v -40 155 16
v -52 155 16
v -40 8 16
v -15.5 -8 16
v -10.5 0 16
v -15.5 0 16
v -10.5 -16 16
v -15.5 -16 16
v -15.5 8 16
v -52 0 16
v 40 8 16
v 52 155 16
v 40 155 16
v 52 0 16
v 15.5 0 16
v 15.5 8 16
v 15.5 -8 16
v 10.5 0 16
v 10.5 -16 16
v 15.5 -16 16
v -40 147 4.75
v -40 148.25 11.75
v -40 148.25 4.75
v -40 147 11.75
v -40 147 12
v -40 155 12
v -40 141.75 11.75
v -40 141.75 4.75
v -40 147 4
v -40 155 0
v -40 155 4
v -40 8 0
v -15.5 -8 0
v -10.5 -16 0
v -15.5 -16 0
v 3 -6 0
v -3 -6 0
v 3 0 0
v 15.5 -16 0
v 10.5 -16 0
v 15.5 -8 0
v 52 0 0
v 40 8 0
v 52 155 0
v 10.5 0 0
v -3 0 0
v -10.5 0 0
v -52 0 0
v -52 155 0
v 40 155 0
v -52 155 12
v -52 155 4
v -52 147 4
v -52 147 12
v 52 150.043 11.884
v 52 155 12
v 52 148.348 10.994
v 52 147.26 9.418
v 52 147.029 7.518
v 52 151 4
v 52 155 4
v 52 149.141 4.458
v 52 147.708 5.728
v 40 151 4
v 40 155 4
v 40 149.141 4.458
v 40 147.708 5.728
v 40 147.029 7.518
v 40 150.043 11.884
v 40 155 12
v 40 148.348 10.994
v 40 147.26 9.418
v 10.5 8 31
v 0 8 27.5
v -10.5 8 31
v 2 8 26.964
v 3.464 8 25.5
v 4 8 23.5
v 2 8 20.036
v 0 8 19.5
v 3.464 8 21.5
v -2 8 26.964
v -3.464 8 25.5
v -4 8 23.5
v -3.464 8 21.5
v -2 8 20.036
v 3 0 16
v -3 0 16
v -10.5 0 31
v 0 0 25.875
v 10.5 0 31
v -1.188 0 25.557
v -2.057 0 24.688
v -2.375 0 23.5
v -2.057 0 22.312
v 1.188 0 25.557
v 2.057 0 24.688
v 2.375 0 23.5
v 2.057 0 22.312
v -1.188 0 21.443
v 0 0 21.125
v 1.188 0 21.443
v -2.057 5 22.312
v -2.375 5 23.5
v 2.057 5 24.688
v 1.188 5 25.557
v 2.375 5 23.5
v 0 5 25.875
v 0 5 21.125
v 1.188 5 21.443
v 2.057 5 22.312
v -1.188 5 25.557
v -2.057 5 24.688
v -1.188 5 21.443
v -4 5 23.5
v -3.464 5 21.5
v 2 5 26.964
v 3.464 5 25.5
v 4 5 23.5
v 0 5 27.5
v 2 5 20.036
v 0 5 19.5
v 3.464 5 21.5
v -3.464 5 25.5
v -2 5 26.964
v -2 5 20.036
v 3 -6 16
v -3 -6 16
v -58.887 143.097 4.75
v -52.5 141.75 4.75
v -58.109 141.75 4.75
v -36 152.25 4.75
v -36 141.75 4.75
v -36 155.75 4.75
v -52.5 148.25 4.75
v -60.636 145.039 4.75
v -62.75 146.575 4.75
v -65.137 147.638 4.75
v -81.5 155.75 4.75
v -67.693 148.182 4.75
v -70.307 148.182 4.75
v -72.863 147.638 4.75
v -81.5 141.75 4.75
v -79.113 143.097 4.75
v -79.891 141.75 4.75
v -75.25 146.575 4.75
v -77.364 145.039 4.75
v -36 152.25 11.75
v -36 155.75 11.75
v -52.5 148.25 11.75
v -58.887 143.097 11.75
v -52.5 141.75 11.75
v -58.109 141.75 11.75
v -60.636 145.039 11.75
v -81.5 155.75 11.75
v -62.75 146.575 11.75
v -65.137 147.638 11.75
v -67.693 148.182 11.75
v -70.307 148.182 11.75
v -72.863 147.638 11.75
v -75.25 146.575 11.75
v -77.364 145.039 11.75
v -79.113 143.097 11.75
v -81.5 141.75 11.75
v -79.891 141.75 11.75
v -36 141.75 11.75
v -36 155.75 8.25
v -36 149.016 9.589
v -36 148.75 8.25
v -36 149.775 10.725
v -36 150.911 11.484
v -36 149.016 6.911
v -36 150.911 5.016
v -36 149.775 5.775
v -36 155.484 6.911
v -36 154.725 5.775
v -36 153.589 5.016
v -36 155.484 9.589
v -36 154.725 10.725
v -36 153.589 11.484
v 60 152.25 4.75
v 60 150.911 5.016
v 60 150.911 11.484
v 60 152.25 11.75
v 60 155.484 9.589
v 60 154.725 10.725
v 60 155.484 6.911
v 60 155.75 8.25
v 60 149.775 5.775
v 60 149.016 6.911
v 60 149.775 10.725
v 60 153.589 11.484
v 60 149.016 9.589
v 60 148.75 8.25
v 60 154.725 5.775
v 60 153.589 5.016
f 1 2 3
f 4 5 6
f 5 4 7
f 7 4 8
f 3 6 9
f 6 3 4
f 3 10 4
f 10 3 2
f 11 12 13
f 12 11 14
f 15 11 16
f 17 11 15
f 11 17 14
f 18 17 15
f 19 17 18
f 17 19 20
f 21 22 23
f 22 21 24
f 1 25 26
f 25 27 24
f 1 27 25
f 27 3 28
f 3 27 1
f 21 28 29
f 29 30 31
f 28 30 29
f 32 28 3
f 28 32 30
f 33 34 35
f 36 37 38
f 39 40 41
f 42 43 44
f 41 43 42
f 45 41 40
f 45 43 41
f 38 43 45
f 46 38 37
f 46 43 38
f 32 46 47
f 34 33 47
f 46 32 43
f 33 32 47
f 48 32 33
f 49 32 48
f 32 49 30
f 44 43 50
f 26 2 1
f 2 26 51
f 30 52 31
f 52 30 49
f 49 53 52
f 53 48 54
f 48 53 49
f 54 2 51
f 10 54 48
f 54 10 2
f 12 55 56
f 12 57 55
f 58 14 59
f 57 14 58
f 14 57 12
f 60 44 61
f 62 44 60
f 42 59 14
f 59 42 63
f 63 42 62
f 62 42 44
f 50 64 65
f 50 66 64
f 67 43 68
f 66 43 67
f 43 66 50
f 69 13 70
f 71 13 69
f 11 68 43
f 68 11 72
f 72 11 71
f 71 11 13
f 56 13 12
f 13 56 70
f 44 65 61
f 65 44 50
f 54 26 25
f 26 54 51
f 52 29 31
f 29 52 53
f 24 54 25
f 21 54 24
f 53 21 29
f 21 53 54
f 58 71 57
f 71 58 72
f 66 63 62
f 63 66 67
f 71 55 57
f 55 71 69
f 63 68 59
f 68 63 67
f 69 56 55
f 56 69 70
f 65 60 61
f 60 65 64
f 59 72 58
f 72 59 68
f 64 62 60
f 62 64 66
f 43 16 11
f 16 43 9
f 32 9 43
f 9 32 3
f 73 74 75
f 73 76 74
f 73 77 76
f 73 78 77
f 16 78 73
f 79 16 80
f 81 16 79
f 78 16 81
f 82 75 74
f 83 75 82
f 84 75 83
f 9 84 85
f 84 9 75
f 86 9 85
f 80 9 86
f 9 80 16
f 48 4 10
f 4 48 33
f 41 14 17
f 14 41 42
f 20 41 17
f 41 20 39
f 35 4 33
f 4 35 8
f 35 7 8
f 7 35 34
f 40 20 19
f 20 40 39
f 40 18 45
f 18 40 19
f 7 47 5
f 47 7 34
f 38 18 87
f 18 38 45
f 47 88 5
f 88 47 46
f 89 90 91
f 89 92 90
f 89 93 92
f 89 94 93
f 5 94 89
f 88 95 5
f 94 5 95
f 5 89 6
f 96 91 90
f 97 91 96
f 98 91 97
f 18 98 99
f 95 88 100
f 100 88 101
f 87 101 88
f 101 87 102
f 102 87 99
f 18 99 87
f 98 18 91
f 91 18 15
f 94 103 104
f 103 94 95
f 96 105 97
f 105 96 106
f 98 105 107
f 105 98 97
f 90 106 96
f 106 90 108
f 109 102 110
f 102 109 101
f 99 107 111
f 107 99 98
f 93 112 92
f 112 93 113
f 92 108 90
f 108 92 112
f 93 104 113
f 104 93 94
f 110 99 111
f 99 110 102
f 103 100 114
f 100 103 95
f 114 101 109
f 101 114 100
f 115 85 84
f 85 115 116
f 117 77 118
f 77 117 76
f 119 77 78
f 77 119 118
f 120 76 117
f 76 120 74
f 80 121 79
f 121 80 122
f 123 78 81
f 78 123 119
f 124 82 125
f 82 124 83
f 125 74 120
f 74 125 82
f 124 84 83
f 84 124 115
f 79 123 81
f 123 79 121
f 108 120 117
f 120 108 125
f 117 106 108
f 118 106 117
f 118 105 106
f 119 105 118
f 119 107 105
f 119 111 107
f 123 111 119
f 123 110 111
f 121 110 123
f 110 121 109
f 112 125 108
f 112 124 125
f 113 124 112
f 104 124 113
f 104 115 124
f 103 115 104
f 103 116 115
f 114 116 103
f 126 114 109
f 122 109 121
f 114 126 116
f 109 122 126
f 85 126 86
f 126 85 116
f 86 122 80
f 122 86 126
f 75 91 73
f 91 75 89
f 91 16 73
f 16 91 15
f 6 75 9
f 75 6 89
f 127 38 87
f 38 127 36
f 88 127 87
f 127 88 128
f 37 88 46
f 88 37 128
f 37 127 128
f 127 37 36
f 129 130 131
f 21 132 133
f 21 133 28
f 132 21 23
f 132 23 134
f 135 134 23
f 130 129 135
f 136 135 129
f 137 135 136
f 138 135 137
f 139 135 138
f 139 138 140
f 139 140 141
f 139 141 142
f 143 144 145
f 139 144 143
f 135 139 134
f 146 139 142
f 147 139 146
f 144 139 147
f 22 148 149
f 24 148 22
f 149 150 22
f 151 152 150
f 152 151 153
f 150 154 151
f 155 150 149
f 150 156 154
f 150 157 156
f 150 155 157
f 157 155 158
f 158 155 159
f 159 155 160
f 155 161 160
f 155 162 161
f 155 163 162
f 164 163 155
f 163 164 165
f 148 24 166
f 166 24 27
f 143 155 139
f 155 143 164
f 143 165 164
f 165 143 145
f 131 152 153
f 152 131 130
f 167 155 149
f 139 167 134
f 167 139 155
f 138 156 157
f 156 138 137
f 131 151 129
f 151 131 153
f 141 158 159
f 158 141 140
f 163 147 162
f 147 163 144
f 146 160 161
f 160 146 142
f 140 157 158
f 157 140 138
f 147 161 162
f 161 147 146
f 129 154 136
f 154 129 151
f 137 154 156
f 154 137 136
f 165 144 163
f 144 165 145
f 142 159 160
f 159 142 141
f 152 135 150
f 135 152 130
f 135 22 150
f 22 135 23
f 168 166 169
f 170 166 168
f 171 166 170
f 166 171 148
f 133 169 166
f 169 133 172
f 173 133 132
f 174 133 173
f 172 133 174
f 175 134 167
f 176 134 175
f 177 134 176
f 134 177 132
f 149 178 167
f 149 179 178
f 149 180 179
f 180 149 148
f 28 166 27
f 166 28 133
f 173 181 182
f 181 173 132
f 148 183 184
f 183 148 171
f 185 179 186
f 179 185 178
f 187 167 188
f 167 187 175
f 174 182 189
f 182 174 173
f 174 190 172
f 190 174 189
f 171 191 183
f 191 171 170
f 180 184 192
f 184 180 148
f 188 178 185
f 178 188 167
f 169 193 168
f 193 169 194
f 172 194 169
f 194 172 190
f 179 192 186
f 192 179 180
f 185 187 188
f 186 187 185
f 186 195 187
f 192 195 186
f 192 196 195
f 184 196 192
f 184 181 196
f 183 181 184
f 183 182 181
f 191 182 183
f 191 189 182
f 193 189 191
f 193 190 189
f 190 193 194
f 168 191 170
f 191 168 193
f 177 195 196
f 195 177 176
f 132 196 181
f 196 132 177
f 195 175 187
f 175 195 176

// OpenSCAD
/* https://www.thingiverse.com/theamm/about */

// Current part display
part = "both"; // [both:Both, holder:Holder, rod:Rod]

// Should we offset the mount part?
mount_center_offset = 0; // [-50:50]

// Thickness (Y-wise) of the arms
arm_thickness = 12;
// Width (X-wise) of the arms
arm_width     = 16;

// Maximum width of a roll to fit between the arms
roll_width = 80;
// Maximum diameter of a roll to account for
roll_diameter = 200;
// The biggest roll center hole to account for
roll_hole_diameter = 60;

// Support rod diameter
rod_diameter = 7.5;

// How far down will the slanted support reach?
// 0.0 disables it, 1.0 will reach all the way down.
mount_support_height_ratio = 0.5;

/* [Hidden] */

rod_support_thickness = 4;
rod_clearance = 8; // Extra width on the rod

// 2020 aluminum bar
bar_width = 20 + 1;
bar_center_width = 6; // The center hole

base_height = 8;     // The "floor" between the arms
mount_thickness = 5; // The thickness of the prongs
mount_height = 16;

// Screw hole
mount_hole_diameter  = 4.0 + 0.75;
// Screw well
mount_hole_well = 8.0;


clearance_margin = 25;
minimum_clearance = (roll_diameter + roll_hole_diameter)/2 + clearance_margin;

output_part();

// Creates two mirrored arms with the given distance, height and thickness
module holder_arms(arm_separation, arm_width, arm_thickness, arm_height) {
    module single_arm() {
        translate([arm_separation/2, 0])
            cube([arm_thickness, arm_height, arm_width]);
    }
    union() {
        mirror() single_arm();
                 single_arm();
    }
}

// Roll holder
module roll_holder() {
    difference() {
        holder_arms(roll_width, arm_width, arm_thickness, minimum_clearance);
        
        r_d = rod_diameter + 0.5; // Adjust fit a bit
        
        // Left cube slot
        translate([-roll_width/2-arm_thickness - 1, minimum_clearance-r_d, (arm_width-r_d)/2])
            cube([arm_thickness+2, r_d, r_d]);
        
        // Right cylinder slot
        hull() {
            
            translate([roll_width/2-1, minimum_clearance, (arm_width-r_d)/2])
                cube([arm_thickness+2, r_d, r_d]);
            translate([roll_width/2-1, minimum_clearance-(r_d/2), (arm_width)/2])
                rotate([0, 90,0]) cylinder(d=r_d, h=arm_thickness+2);
        }
    }
    
    mount_bot_w = bar_width + mount_thickness*2;
    mount_bot_hull_h = mount_height * mount_support_height_ratio;
    // Bottom structure
    difference() {
        union() {
            hull() {
                // Center base "floor"
                translate([0, base_height/2, arm_width/2])
                    cube([roll_width + arm_thickness*2, base_height, arm_width], center=true);
                // The end piece for slanted supports
                translate([-mount_bot_w/2 + mount_center_offset, -mount_bot_hull_h, 0])
                    cube([mount_bot_w, mount_bot_hull_h, arm_width]);
            }
            
            // Full-size end piece for prongs
            translate([-mount_bot_w/2 + mount_center_offset, -mount_height, 0])
                    cube([mount_bot_w, mount_height, arm_width]);
        }
        
        // Remove 2020 (fudged a bit for clean previews)
        translate([-bar_width/2 + mount_center_offset, -bar_width-1, -1])
                cube([bar_width, bar_width+1, arm_width+2]);
    }
    
    translate([mount_center_offset, 0]) {
        // Center plug for mount
        translate([-bar_center_width/2, -bar_center_width])
            cube([bar_center_width, bar_center_width, arm_width]);
        
        // Mount lip
        translate([0,0, arm_width]) {
            lip_w1 = mount_bot_w;
            lip_w2 = bar_width;
            lip_l  = 15;
            difference() {
                hull() {
                    // Base
                    translate([-lip_w1/2, 0, -arm_width]) cube([lip_w1, base_height, arm_width]);
                    // End
                    translate([-lip_w2/2, 0, lip_l-1]) cube([lip_w2, base_height, 1]);
                }
                // Screw hole
                translate([0, base_height, lip_l/2]) rotate([90,0,0]) {
                    cylinder(d=mount_hole_diameter, h=base_height+1, $fn=12);
                    translate([0,0,-1]) cylinder(d=mount_hole_well, h=3+1, $fn=12);
                }
            }
        }
    }
}

module roll_rod() {
    // Make the slot fit better
    spacing = 0.5;
    p_h = rod_diameter - spacing;
    // Center piece
    translate([-spacing, -p_h/2])
        cube([arm_thickness+spacing, rod_diameter, p_h]);
    
    // Back prong
    translate([-rod_support_thickness-spacing, -p_h/2])
            cube([rod_support_thickness, p_h*2, p_h]);
    // Front prong
    translate([arm_thickness, -p_h/2])
            cube([rod_support_thickness, p_h*2, p_h]);
    
    // Handle
    handle_w = 25;
    translate([-handle_w-spacing-rod_support_thickness, -p_h/2]) difference() {
        cube([handle_w, p_h*2, p_h]);
        translate([handle_w/2, p_h*2+6, -1]) cylinder(d=25, h=p_h+2);
    }
    
    // Cyl
    translate([arm_thickness, 0, p_h/2])
        rotate([0,90,0]) cylinder(d=p_h, h=roll_width + arm_thickness + rod_clearance, $fn=16);
}
//part="rod";
module output_part() {
    if (part == "both") {
        roll_holder();
        
        translate([0, minimum_clearance-(rod_diameter/2) + 1, (arm_width)/2])
            translate([-roll_width/2 - arm_thickness, 0,0]) rotate([180,0,0])
            translate([0,0,-rod_diameter/2]) color("red") roll_rod();
    } else if (part == "holder") {
        roll_holder();
    } else if (part == "rod") {
        roll_rod();
    }
}
